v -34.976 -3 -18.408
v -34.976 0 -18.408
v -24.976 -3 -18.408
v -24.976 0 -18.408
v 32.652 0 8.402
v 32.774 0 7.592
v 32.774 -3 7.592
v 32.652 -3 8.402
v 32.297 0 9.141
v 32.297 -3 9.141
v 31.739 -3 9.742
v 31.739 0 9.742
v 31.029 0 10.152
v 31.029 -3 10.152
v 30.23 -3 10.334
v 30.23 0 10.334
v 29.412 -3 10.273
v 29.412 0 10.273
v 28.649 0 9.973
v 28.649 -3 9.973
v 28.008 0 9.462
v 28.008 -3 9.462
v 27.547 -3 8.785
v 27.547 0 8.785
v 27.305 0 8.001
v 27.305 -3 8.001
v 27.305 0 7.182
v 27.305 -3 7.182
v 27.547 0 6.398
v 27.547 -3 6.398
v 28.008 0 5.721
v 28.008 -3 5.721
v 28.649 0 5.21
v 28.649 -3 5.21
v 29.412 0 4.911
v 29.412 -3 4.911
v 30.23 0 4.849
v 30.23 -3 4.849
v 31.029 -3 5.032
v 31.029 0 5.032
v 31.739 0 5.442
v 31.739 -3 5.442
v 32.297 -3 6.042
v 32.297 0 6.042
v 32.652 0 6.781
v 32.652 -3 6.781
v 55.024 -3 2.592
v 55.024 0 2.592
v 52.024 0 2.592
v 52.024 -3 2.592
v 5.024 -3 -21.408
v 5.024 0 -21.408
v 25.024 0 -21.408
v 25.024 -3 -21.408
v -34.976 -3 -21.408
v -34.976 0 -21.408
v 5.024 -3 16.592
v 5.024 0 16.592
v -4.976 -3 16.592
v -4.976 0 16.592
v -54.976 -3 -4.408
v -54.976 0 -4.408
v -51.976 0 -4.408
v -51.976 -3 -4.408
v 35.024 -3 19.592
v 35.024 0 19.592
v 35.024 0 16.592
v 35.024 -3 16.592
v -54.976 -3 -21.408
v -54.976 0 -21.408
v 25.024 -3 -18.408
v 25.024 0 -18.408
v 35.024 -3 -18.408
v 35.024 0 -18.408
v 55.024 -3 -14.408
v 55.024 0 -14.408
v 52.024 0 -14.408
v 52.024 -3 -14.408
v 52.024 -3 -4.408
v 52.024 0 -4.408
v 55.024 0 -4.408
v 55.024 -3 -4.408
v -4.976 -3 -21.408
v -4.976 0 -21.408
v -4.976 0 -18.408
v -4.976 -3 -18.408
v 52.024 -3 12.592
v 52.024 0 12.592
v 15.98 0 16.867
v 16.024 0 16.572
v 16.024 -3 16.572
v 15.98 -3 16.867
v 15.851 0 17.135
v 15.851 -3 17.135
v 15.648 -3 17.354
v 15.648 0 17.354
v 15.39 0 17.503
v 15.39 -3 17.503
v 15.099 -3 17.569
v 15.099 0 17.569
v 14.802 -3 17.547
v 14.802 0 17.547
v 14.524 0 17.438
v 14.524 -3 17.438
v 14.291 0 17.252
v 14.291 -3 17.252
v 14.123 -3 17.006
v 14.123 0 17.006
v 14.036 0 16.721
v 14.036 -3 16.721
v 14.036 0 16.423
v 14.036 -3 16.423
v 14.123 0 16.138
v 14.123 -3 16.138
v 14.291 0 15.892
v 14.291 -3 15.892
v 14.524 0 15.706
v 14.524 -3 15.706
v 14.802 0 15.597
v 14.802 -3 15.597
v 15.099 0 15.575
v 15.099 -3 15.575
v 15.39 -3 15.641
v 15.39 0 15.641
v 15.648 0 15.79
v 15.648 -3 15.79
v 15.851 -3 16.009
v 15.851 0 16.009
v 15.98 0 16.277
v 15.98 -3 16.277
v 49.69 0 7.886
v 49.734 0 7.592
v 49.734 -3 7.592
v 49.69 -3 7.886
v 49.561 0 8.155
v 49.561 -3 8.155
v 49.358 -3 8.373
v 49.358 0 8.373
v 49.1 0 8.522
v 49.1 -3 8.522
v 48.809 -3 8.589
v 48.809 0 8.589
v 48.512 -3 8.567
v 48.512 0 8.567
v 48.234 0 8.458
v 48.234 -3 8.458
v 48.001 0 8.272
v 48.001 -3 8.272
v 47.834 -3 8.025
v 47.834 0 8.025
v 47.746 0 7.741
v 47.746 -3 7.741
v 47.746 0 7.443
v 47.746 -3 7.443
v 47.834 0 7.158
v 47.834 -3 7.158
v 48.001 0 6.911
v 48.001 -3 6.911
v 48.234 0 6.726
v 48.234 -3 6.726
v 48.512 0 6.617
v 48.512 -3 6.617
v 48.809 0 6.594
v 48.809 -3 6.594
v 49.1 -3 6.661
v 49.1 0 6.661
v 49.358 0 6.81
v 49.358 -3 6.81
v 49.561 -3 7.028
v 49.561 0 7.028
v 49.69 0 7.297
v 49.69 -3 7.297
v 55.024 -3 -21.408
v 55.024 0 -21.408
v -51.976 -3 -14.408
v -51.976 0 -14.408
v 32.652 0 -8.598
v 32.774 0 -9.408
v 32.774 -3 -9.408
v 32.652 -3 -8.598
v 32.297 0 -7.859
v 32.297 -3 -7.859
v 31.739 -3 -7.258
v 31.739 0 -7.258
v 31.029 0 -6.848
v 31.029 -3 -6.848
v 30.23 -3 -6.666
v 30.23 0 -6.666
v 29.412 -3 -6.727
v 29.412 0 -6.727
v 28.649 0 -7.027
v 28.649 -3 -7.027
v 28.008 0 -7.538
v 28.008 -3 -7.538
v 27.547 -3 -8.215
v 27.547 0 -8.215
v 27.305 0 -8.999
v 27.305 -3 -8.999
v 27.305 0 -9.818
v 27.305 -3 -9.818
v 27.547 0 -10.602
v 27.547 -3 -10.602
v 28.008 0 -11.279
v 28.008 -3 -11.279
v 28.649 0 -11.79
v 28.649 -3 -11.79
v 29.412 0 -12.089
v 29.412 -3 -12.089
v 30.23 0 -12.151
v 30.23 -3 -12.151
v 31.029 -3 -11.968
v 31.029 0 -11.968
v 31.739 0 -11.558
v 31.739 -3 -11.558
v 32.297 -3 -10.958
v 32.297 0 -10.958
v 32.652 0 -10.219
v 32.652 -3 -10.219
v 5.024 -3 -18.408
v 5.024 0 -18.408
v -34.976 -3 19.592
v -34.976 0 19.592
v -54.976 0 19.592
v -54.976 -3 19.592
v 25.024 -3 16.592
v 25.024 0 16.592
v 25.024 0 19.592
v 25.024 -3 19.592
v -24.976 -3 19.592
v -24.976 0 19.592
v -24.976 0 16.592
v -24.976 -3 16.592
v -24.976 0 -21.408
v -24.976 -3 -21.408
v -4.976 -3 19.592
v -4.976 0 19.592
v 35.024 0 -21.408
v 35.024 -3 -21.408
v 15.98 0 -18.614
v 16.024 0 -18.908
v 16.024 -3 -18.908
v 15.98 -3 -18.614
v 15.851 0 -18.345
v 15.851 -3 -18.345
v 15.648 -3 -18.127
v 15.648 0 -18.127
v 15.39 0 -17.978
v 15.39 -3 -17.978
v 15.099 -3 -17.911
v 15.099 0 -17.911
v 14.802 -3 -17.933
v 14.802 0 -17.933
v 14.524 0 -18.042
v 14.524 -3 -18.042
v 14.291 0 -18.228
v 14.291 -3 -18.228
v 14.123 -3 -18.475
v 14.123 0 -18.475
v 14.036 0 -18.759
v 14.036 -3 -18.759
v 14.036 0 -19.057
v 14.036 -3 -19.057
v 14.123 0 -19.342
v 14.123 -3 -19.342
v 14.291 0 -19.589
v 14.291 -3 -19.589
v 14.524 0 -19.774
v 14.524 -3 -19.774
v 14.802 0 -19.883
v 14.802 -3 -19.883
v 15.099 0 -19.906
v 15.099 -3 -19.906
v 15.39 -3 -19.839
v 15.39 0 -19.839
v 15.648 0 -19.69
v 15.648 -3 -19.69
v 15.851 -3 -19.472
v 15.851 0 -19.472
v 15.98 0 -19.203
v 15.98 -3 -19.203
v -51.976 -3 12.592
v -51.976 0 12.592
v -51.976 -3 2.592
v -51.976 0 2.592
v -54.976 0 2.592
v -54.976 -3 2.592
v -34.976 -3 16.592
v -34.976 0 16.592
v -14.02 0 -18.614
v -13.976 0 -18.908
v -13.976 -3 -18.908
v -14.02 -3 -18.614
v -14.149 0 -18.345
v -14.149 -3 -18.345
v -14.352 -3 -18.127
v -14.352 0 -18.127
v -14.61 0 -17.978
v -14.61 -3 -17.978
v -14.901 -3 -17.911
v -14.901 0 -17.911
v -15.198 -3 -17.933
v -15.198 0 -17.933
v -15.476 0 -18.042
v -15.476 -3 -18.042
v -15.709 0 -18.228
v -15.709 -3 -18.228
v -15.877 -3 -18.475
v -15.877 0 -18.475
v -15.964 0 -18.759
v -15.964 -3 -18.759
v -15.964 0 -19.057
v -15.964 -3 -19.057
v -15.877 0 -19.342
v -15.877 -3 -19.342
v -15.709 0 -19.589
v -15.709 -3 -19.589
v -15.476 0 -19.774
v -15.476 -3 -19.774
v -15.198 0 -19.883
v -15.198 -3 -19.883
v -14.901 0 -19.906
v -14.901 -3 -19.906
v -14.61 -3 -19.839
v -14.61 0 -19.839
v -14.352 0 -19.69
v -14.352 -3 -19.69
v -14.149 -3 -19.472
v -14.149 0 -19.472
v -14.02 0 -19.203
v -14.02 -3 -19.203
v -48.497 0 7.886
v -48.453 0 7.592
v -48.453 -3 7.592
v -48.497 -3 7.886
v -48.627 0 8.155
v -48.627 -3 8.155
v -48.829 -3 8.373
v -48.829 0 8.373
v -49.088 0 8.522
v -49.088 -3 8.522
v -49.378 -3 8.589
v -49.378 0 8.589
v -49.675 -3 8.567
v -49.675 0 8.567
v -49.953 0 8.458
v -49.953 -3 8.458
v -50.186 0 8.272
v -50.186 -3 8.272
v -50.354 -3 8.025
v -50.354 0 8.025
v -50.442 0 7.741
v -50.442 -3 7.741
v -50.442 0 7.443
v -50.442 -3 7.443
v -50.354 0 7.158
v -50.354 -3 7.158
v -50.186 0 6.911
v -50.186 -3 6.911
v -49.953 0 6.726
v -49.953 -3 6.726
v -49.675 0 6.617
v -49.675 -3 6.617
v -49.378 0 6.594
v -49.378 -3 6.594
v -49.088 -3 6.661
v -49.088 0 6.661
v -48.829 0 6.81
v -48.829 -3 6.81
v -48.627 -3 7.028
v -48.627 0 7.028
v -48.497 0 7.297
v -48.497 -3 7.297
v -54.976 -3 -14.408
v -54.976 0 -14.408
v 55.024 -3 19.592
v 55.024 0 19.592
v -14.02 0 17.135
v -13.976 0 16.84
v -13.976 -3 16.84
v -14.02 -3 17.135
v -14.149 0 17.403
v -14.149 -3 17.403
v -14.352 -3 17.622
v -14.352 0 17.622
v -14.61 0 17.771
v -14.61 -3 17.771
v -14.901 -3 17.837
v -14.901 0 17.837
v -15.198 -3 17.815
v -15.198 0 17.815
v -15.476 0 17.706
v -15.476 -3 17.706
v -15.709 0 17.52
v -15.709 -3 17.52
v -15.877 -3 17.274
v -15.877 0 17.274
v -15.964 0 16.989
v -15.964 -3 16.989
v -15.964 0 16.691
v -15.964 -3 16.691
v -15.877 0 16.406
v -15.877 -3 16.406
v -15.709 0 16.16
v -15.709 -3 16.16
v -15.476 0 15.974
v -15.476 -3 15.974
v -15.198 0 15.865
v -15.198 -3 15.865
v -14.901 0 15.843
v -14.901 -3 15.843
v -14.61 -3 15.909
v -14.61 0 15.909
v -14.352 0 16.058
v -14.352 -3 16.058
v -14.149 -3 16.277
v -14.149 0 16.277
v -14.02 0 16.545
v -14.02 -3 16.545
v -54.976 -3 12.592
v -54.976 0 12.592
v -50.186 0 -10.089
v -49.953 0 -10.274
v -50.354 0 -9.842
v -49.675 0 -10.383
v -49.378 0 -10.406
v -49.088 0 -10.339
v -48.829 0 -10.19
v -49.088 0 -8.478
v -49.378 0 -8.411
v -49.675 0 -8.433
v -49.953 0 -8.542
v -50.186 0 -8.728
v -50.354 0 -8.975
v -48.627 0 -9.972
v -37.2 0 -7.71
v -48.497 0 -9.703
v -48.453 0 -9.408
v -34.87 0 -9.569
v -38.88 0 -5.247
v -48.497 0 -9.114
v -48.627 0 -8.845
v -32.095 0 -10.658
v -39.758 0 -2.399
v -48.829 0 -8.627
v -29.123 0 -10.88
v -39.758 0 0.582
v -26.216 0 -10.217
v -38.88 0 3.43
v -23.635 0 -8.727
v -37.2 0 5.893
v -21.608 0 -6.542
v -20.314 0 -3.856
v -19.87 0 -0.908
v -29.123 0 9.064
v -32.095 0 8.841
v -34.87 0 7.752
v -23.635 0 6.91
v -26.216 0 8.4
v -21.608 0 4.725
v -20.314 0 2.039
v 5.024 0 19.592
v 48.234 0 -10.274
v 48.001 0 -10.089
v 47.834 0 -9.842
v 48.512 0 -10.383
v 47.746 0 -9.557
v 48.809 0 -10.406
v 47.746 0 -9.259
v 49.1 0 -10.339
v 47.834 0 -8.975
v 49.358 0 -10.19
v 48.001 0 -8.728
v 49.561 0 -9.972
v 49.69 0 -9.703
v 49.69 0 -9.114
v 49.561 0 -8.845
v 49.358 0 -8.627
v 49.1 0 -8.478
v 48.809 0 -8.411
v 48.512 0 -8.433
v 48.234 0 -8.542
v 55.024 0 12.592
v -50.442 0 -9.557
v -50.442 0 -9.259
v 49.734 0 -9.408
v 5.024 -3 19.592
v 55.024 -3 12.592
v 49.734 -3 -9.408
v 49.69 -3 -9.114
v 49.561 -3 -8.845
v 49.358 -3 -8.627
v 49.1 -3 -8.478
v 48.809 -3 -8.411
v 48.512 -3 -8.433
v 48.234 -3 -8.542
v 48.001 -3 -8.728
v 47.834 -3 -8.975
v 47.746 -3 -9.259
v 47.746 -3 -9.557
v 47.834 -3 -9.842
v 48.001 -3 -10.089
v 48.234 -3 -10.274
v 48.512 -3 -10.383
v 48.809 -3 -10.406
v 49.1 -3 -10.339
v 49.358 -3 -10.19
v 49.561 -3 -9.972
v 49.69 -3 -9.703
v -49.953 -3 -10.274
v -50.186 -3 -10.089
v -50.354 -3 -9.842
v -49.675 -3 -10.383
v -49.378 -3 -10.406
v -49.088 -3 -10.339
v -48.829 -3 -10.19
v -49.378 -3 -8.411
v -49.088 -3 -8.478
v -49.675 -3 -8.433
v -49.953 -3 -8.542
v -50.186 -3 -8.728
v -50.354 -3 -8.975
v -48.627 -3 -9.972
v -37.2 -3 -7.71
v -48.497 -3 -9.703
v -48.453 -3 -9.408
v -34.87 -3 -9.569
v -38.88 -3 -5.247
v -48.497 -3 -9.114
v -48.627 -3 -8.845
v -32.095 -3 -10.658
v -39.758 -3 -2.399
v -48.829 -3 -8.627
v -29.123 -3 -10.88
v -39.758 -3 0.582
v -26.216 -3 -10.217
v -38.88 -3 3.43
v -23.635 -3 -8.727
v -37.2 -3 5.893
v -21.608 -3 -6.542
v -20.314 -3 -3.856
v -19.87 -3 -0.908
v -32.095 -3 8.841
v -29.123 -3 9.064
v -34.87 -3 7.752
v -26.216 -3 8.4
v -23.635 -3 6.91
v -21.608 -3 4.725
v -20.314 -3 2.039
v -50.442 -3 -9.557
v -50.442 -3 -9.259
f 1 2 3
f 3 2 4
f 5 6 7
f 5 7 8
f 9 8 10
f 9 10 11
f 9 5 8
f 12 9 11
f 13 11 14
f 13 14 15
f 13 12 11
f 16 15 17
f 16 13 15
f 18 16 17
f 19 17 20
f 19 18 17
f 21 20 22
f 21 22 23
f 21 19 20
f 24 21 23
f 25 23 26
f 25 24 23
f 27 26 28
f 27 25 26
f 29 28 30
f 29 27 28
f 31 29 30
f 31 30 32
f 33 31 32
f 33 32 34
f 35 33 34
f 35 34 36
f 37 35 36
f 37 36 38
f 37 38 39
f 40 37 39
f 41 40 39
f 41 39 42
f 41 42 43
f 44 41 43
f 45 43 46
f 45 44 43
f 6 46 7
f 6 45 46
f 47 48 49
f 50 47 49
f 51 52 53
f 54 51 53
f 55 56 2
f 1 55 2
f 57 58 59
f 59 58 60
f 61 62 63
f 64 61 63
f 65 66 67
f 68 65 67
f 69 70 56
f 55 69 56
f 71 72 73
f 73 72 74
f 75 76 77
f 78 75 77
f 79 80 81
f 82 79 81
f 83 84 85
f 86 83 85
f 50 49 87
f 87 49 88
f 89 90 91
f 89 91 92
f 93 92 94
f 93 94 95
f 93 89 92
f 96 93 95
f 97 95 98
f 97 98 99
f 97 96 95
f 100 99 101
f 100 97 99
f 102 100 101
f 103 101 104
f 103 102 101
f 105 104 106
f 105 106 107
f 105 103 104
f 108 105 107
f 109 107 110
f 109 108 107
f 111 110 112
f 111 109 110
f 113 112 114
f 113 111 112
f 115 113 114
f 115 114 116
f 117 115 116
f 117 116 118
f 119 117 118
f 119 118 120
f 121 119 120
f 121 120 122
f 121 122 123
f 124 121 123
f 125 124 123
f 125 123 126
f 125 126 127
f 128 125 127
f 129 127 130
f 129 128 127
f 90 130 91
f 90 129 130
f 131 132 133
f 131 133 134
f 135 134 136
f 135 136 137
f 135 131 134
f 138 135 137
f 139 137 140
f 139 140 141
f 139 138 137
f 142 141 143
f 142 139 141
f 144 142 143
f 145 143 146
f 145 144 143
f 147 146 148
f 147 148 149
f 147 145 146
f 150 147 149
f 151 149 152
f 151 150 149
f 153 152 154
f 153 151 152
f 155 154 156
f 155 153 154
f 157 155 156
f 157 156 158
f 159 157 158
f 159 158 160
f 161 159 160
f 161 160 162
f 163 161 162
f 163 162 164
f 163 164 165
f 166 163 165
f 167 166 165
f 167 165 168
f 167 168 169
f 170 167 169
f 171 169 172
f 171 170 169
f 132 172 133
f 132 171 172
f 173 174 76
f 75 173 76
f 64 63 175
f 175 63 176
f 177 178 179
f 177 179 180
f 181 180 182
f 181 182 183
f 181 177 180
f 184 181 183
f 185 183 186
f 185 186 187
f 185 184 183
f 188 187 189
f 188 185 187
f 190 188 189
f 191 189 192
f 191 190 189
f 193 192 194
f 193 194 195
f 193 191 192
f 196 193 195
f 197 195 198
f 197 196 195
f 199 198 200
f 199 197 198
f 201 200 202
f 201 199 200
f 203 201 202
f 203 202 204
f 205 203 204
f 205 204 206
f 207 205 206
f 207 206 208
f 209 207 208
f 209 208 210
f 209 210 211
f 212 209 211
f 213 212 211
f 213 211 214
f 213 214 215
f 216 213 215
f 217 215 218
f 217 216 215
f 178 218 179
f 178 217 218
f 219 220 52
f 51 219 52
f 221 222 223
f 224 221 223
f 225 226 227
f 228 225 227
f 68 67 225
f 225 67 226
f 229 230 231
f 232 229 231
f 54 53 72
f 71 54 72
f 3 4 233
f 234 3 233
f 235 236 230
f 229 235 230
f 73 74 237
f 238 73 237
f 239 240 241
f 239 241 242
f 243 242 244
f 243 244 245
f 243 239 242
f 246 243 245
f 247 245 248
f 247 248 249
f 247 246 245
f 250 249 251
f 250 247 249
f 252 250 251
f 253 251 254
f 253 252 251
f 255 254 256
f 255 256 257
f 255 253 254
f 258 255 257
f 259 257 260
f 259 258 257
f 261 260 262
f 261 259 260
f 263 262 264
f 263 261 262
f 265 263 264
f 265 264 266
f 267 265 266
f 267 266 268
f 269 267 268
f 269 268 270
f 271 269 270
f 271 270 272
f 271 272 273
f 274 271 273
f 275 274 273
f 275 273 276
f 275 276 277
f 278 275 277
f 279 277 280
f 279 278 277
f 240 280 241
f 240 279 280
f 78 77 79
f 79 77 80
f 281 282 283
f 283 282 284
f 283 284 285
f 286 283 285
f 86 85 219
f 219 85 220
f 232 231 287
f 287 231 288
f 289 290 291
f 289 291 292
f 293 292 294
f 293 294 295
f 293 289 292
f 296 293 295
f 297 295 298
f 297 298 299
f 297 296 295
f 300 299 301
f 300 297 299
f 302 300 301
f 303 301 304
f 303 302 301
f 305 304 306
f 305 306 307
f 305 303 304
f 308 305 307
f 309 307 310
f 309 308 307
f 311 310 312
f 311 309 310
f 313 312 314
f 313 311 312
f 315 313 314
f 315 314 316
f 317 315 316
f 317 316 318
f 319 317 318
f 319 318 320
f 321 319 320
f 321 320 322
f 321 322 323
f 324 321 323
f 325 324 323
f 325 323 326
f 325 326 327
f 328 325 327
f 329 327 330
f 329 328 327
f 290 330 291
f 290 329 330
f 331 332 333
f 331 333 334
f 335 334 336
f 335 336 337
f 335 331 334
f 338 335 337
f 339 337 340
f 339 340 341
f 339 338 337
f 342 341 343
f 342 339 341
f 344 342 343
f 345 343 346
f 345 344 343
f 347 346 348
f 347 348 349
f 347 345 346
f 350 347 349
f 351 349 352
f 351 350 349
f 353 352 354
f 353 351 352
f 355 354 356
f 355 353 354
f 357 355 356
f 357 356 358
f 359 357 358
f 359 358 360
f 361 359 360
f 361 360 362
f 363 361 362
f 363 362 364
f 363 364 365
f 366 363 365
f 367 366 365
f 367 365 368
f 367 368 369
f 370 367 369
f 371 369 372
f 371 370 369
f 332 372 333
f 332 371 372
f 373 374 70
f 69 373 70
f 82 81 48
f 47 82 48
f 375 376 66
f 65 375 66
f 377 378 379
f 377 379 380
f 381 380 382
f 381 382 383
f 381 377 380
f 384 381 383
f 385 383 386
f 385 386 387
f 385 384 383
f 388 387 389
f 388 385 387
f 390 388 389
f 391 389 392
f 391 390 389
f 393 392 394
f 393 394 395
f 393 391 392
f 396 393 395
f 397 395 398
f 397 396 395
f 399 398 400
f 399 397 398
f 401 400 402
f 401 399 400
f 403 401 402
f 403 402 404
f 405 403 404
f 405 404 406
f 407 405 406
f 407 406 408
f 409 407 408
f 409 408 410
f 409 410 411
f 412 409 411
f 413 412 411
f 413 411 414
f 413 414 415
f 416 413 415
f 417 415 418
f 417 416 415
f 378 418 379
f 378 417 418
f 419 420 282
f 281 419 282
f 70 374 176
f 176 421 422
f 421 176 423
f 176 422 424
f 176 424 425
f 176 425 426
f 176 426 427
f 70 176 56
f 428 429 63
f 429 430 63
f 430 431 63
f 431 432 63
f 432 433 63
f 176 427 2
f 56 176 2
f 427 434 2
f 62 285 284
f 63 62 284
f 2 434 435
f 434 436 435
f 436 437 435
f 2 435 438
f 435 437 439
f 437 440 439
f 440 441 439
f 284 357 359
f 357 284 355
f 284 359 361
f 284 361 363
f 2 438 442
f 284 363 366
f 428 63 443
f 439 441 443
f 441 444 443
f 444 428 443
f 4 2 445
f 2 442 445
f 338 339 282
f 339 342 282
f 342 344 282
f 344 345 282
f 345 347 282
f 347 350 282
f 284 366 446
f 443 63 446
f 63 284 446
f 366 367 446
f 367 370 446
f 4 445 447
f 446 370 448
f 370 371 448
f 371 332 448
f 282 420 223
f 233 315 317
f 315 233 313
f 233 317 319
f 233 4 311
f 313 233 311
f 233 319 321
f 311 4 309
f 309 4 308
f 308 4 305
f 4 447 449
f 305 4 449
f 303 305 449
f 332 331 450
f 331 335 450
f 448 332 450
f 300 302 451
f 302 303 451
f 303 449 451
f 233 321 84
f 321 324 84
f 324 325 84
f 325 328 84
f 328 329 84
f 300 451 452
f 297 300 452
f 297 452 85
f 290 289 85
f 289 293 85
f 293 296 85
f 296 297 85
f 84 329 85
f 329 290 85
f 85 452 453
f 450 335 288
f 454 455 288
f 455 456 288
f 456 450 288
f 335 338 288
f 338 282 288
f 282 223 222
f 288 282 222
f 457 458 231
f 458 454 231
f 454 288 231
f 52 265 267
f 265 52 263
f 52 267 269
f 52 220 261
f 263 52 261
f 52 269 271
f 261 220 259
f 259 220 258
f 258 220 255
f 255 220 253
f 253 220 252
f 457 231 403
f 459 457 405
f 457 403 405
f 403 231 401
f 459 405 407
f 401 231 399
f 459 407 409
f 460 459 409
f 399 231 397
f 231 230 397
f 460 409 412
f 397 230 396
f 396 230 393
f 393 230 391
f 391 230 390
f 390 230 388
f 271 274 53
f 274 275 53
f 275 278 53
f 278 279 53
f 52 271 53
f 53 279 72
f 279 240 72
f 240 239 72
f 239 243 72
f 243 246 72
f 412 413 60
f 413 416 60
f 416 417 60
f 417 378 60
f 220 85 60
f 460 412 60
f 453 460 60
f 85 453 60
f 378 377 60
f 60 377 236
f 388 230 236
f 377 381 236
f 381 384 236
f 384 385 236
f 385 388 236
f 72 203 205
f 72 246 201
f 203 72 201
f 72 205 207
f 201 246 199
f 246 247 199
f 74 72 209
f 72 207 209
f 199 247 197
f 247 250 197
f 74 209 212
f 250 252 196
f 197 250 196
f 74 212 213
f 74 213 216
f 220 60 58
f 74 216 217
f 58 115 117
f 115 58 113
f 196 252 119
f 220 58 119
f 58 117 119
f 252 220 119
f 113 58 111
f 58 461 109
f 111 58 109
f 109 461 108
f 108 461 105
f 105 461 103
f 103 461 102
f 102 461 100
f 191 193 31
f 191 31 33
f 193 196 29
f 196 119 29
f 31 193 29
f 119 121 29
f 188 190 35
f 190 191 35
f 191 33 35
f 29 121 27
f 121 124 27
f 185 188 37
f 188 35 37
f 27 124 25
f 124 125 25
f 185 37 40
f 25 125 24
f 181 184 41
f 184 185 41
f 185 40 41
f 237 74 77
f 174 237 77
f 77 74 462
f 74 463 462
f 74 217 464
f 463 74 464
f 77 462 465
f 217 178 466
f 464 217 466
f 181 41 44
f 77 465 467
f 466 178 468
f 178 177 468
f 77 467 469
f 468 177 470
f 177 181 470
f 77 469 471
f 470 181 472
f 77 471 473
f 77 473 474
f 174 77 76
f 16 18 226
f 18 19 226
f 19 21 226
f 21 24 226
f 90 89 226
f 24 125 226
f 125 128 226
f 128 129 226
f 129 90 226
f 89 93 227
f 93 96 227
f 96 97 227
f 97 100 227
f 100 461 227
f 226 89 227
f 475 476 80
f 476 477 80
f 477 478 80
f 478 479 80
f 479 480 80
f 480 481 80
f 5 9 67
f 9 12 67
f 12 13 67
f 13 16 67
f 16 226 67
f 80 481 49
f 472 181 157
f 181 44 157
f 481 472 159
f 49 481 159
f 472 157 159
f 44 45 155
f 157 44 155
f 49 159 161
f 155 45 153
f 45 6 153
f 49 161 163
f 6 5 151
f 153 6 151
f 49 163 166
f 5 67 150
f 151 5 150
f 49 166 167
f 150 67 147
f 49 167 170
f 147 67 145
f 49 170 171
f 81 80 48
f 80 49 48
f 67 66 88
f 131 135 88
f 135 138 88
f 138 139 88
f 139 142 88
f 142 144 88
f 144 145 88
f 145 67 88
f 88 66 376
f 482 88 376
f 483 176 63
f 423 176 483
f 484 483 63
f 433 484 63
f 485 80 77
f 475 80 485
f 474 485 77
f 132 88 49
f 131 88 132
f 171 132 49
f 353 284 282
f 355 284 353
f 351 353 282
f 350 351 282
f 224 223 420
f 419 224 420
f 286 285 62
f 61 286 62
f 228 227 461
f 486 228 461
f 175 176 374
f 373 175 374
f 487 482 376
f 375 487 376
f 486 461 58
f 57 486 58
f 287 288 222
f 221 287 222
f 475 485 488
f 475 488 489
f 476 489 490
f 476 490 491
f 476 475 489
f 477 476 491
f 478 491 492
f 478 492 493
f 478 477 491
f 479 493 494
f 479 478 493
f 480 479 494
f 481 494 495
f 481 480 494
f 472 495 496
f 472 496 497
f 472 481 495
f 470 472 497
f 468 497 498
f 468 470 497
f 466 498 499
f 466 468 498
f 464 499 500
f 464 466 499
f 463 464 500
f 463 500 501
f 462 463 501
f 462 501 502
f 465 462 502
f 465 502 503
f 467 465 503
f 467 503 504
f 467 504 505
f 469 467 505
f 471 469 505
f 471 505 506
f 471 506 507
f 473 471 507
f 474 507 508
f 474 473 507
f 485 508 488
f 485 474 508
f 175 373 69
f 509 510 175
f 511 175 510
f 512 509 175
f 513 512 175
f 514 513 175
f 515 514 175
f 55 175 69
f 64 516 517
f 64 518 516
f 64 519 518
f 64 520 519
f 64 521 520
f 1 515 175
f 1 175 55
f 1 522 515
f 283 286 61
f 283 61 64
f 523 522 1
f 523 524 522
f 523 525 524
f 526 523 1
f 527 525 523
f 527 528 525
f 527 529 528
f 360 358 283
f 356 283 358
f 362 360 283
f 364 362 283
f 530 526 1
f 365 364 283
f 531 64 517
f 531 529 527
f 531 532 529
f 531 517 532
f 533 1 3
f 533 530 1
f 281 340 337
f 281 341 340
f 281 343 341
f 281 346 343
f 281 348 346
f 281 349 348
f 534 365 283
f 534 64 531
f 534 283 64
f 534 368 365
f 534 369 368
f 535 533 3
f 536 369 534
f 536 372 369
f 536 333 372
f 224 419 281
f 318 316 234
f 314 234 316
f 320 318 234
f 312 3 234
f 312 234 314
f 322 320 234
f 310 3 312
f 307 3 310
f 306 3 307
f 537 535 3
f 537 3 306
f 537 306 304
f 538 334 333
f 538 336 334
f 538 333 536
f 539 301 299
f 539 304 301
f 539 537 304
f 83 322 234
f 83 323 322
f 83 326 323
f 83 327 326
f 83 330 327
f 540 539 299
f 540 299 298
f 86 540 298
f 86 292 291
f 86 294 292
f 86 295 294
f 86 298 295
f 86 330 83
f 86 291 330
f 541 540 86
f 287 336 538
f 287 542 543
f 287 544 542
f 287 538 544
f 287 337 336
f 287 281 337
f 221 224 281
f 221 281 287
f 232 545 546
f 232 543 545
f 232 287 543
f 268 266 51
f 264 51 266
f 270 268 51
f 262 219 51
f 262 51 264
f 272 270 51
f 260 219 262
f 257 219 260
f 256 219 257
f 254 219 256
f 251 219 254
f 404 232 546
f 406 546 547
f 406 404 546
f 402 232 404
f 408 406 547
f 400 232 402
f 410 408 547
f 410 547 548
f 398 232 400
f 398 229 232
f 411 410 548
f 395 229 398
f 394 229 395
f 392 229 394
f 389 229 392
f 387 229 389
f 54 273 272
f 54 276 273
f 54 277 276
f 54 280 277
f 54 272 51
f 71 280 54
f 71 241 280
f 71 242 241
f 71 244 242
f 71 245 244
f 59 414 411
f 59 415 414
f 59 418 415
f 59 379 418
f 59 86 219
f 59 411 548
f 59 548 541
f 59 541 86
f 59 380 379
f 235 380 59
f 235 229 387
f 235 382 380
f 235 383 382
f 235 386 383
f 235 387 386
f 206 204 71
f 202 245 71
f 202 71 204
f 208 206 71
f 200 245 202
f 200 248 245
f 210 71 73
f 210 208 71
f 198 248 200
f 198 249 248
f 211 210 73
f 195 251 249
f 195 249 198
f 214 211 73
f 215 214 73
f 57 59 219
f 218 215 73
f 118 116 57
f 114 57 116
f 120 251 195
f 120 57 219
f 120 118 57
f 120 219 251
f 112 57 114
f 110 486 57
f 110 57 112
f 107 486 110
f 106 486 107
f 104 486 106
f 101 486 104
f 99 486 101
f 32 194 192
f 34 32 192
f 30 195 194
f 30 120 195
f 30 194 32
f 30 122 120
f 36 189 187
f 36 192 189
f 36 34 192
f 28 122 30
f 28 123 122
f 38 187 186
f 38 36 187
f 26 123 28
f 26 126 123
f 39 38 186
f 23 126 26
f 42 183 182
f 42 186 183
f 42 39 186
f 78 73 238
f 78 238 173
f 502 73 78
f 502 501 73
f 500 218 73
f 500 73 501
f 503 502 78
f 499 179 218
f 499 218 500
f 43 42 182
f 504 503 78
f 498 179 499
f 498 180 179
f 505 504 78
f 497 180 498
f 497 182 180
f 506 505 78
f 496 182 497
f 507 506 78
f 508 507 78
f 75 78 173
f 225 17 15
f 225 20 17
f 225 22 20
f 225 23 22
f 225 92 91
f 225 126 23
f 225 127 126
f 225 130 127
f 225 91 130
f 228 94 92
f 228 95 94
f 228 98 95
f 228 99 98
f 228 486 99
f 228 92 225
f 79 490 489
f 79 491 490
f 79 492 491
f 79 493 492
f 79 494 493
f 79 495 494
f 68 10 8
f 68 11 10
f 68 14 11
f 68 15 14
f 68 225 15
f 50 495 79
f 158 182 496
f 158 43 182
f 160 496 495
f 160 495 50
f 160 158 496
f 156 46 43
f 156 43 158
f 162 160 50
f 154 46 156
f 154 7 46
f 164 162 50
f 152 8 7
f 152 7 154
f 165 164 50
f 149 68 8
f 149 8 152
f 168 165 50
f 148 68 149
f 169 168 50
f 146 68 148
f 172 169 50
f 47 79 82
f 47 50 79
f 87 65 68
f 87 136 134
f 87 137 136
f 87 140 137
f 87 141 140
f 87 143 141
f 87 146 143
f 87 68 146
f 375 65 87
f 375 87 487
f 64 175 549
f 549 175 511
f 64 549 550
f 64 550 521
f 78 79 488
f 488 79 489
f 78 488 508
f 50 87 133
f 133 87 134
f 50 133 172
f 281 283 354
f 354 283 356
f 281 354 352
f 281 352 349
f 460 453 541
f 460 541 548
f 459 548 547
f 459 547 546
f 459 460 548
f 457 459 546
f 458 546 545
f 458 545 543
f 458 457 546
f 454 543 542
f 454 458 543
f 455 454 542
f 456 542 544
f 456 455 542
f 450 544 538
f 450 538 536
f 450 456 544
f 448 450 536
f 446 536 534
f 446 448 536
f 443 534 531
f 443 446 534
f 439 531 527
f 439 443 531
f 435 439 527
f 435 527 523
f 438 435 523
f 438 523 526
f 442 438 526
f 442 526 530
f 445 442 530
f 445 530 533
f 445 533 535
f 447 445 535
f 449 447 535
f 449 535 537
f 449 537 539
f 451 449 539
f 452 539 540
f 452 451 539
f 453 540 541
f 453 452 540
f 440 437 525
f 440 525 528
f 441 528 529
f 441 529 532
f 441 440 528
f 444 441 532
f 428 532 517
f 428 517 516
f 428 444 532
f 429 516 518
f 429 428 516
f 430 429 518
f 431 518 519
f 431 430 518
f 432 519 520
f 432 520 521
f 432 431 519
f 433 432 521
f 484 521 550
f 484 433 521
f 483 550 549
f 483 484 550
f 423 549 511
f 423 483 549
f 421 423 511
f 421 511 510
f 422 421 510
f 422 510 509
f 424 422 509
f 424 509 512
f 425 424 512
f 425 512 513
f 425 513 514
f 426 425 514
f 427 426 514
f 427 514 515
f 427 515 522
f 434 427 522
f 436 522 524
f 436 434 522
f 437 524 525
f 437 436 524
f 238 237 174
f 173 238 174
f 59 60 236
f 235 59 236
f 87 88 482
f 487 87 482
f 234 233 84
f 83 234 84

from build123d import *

# Parameters (mm, degrees)
F0_R     = 1
F0_R_2   = 10
F0_R_3   = 2.75
F1_DEPTH = 3


with BuildPart() as f1:
    # F0 (on Front) → F1 (new body)
    with BuildSketch(Plane.XZ):
        Polygon((-51.975646, 2.591607), (-54.975646, 2.591607), (-54.975646, -0.908393), (-54.975646, -4.408393), (-51.975646, -4.408393), (-51.975646, -14.408393), (-54.975646, -14.408393), (-54.975646, -21.408393), (-34.975646, -21.408393), (-34.975646, -18.408393), (-24.975646, -18.408393), (-24.975646, -21.408393), (-4.975646, -21.408393), (-4.975646, -18.408393), (0.024354, -18.408393), (5.024354, -18.408393), (5.024354, -21.408393), (25.024354, -21.408393), (25.024354, -18.408393), (35.024354, -18.408393), (35.024354, -21.408393), (55.024354, -21.408393), (55.024354, -14.408393), (52.024354, -14.408393), (52.024354, -4.408393), (55.024354, -4.408393), (55.024354, -0.908393), (55.024354, 2.591607), (52.024354, 2.591607), (52.024354, 12.591607), (55.024354, 12.591607), (55.024354, 19.591607), (35.024354, 19.591607), (35.024354, 16.591607), (25.024354, 16.591607), (25.024354, 19.591607), (5.024354, 19.591607), (5.024354, 16.591607), (0.024354, 16.591607), (-4.975646, 16.591607), (-4.975646, 19.591607), (-24.975646, 19.591607), (-24.975646, 16.591607), (-34.975646, 16.591607), (-34.975646, 19.591607), (-54.975646, 19.591607), (-54.975646, 12.591607), (-51.975646, 12.591607), align=None)
        with Locations((-14.975646, -18.908393)):
            Circle(F0_R, mode=Mode.SUBTRACT)
        with Locations((-49.452938, -9.408393)):
            Circle(F0_R, mode=Mode.SUBTRACT)
        with Locations((-29.869903, -0.908393)):
            Circle(F0_R_2, mode=Mode.SUBTRACT)
        with Locations((15.024354, -18.908393)):
            Circle(F0_R, mode=Mode.SUBTRACT)
        with Locations((30.024354, -9.408393)):
            Circle(F0_R_3, mode=Mode.SUBTRACT)
        with Locations((48.734484, -9.408393)):
            Circle(F0_R, mode=Mode.SUBTRACT)
        with Locations((-49.452938, 7.591607)):
            Circle(F0_R, mode=Mode.SUBTRACT)
        with Locations((-14.975646, 16.840009)):
            Circle(F0_R, mode=Mode.SUBTRACT)
        with Locations((30.024354, 7.591607)):
            Circle(F0_R_3, mode=Mode.SUBTRACT)
        with Locations((48.734484, 7.591607)):
            Circle(F0_R, mode=Mode.SUBTRACT)
        with Locations((15.024354, 16.571959)):
            Circle(F0_R, mode=Mode.SUBTRACT)
    extrude(amount=F1_DEPTH)


solid = f1.part
